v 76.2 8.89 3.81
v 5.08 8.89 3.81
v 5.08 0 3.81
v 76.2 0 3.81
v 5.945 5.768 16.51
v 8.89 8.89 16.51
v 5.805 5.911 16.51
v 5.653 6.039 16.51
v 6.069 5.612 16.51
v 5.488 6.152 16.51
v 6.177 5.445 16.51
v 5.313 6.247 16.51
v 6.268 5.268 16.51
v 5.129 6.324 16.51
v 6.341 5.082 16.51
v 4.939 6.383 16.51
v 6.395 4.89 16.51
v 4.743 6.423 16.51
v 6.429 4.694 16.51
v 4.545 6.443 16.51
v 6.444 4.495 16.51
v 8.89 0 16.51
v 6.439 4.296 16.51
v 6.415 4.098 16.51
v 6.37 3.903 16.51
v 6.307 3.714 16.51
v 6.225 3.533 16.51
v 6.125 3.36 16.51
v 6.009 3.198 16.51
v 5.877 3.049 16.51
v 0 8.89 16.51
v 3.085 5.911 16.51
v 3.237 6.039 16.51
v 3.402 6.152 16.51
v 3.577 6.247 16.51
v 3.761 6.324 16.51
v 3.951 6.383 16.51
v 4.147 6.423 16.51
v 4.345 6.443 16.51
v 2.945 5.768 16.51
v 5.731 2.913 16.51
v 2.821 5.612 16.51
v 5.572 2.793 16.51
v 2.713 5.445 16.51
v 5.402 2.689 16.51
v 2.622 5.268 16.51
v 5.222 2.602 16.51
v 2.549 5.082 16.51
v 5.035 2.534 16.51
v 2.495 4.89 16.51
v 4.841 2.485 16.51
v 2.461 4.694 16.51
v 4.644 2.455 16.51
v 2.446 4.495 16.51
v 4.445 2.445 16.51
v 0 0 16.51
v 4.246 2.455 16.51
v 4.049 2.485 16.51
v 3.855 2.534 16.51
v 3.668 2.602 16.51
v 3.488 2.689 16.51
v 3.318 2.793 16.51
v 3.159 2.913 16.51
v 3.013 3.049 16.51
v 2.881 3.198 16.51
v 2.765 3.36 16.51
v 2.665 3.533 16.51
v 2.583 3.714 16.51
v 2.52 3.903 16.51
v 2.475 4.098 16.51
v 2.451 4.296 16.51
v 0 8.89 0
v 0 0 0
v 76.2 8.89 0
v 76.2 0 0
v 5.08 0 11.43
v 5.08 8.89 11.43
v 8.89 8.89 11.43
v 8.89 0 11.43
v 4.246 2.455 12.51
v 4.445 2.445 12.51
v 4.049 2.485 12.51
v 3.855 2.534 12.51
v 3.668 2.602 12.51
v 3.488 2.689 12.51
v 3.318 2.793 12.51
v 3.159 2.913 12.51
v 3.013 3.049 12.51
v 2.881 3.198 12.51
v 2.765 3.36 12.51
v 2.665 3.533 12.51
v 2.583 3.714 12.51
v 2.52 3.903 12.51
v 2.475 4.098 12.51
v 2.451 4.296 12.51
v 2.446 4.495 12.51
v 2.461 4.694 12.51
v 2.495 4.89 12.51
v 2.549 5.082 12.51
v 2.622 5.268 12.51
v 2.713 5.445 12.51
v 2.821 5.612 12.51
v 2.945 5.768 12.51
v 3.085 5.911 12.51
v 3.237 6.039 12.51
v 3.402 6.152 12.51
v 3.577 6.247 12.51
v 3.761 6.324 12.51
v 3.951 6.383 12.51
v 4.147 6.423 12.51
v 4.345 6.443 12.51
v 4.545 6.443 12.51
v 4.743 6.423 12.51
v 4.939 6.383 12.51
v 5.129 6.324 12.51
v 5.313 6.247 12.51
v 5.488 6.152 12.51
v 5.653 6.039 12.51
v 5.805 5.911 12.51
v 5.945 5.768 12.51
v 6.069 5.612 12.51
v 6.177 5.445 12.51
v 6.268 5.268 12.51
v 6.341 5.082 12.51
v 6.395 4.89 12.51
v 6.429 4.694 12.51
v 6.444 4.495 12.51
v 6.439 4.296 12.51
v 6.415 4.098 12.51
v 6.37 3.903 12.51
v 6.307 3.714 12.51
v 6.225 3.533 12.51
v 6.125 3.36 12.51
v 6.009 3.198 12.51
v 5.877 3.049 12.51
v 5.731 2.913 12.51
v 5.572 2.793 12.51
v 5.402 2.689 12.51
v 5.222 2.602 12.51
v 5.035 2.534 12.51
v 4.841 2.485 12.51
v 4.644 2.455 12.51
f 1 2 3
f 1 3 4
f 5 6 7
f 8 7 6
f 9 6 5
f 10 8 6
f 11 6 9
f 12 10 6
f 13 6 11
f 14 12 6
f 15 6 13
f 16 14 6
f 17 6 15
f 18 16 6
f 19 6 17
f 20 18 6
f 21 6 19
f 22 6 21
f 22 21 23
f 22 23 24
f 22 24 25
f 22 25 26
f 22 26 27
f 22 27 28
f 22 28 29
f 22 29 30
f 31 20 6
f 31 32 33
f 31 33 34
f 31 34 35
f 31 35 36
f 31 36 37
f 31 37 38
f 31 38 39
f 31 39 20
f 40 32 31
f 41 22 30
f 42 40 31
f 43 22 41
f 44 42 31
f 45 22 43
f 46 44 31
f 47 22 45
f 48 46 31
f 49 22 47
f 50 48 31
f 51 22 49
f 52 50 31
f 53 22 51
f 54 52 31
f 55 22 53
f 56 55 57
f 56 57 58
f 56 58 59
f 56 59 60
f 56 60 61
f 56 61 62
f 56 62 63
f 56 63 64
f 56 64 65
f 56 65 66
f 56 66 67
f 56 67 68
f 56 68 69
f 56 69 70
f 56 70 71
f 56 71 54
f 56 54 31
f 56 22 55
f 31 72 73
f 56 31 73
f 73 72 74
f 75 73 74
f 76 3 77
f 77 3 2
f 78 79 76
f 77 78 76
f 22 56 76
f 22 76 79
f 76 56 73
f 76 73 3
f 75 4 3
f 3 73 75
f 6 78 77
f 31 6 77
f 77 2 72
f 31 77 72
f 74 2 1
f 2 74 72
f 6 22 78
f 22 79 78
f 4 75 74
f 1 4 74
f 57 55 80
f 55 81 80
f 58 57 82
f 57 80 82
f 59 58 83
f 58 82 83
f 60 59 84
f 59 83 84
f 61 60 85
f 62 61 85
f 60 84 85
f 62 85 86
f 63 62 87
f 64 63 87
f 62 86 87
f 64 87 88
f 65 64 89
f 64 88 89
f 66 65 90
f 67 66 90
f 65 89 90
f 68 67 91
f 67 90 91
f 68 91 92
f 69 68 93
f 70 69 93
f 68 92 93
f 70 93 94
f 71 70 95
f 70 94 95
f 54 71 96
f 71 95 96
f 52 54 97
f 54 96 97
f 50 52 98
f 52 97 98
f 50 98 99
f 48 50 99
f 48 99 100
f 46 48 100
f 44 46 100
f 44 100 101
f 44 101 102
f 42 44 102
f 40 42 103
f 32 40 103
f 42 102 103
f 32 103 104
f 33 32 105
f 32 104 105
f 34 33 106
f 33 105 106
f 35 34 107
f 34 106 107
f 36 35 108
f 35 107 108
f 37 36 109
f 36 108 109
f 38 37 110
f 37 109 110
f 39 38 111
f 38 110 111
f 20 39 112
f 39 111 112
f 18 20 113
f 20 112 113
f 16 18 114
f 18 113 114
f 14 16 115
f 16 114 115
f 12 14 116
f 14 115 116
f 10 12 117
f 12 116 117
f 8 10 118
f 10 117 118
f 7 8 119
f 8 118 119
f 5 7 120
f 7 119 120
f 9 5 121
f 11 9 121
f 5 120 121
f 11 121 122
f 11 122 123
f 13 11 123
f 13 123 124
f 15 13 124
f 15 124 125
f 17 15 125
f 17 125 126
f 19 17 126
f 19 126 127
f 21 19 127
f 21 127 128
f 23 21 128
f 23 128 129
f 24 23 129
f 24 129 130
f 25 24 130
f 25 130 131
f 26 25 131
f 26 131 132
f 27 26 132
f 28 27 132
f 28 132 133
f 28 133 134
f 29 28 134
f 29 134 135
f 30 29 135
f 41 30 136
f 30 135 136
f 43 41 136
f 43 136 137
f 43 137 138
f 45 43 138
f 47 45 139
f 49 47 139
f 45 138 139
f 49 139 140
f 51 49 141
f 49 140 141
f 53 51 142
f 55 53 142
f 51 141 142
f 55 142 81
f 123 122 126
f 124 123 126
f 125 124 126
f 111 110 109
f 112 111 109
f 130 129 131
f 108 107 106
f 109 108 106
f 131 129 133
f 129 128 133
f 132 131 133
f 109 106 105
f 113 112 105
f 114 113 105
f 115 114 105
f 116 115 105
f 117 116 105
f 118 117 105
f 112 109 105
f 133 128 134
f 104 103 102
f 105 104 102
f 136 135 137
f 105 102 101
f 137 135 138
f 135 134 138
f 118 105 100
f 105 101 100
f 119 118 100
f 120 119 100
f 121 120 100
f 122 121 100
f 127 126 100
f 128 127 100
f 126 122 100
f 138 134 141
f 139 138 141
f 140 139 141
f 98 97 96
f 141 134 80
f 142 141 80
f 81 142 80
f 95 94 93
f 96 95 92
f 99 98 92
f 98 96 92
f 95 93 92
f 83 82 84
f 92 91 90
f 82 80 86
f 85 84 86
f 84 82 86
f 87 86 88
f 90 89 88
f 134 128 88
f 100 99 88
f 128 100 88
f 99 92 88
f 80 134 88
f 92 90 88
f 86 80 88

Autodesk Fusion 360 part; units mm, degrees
sketch "Sketch1" plane through (0, 0, 0) normal (0, 0, 1) x (1, 0, 0)
  line L0 (0, 0) -> (76.2, 0)
  line L1 (76.2, 0) -> (76.2, 8.89)
  line L2 (76.2, 8.89) -> (0, 8.89)
  line L3 (0, 8.89) -> (0, 0)
  dimension "d1" = 76.2
  dimension "d2" = 8.89
extrude "Extrude1" add sketch "Sketch1" along normal blind 3.81
sketch "Sketch2" plane through (0, 0, 3.81) normal (0, 0, 1) x (-1, 0, 0)
  line L0 (0, -8.89) -> (0, 0)
  line L1 (0, 0) -> (-76.2, 0)
  line L2 (-76.2, 0) -> (-76.2, -8.89)
  line L3 (-76.2, -8.89) -> (0, -8.89)
  line L4 (0, 0) -> (-5.08, 0)
  line L5 (-5.08, 0) -> (-5.08, -8.89)
  line L6 (-5.08, -8.89) -> (0, -8.89)
  line L7 (0, -8.89) -> (0, 0)
  dimension "d5" = 5.08
extrude "Extrude2" add sketch "Sketch2" along normal blind 7.62 contours L0 L1 L3 L4 L5 L6 L7
sketch "Sketch3" plane through (0, 0, 11.43) normal (0, 0, 1) x (-1, 0, 0)
  line L0 (0, -8.89) -> (0, 0)
  line L1 (0, 0) -> (-5.08, 0)
  line L2 (-5.08, 0) -> (-5.08, -8.89)
  line L3 (-5.08, -8.89) -> (0, -8.89)
  line L4 (0, 0) -> (-8.89, 0)
  line L5 (-8.89, 0) -> (-8.89, -8.89)
  line L6 (-8.89, -8.89) -> (0, -8.89)
  line L7 (0, -8.89) -> (0, 0)
  dimension "d8" = 8.89
extrude "Extrude3" add sketch "Sketch3" along normal blind 5.08
hole "Hole1" at (4.445, 4.445, 16.51) direction (0, 0, -1) diameter 4 depth 4 tip angle 180
